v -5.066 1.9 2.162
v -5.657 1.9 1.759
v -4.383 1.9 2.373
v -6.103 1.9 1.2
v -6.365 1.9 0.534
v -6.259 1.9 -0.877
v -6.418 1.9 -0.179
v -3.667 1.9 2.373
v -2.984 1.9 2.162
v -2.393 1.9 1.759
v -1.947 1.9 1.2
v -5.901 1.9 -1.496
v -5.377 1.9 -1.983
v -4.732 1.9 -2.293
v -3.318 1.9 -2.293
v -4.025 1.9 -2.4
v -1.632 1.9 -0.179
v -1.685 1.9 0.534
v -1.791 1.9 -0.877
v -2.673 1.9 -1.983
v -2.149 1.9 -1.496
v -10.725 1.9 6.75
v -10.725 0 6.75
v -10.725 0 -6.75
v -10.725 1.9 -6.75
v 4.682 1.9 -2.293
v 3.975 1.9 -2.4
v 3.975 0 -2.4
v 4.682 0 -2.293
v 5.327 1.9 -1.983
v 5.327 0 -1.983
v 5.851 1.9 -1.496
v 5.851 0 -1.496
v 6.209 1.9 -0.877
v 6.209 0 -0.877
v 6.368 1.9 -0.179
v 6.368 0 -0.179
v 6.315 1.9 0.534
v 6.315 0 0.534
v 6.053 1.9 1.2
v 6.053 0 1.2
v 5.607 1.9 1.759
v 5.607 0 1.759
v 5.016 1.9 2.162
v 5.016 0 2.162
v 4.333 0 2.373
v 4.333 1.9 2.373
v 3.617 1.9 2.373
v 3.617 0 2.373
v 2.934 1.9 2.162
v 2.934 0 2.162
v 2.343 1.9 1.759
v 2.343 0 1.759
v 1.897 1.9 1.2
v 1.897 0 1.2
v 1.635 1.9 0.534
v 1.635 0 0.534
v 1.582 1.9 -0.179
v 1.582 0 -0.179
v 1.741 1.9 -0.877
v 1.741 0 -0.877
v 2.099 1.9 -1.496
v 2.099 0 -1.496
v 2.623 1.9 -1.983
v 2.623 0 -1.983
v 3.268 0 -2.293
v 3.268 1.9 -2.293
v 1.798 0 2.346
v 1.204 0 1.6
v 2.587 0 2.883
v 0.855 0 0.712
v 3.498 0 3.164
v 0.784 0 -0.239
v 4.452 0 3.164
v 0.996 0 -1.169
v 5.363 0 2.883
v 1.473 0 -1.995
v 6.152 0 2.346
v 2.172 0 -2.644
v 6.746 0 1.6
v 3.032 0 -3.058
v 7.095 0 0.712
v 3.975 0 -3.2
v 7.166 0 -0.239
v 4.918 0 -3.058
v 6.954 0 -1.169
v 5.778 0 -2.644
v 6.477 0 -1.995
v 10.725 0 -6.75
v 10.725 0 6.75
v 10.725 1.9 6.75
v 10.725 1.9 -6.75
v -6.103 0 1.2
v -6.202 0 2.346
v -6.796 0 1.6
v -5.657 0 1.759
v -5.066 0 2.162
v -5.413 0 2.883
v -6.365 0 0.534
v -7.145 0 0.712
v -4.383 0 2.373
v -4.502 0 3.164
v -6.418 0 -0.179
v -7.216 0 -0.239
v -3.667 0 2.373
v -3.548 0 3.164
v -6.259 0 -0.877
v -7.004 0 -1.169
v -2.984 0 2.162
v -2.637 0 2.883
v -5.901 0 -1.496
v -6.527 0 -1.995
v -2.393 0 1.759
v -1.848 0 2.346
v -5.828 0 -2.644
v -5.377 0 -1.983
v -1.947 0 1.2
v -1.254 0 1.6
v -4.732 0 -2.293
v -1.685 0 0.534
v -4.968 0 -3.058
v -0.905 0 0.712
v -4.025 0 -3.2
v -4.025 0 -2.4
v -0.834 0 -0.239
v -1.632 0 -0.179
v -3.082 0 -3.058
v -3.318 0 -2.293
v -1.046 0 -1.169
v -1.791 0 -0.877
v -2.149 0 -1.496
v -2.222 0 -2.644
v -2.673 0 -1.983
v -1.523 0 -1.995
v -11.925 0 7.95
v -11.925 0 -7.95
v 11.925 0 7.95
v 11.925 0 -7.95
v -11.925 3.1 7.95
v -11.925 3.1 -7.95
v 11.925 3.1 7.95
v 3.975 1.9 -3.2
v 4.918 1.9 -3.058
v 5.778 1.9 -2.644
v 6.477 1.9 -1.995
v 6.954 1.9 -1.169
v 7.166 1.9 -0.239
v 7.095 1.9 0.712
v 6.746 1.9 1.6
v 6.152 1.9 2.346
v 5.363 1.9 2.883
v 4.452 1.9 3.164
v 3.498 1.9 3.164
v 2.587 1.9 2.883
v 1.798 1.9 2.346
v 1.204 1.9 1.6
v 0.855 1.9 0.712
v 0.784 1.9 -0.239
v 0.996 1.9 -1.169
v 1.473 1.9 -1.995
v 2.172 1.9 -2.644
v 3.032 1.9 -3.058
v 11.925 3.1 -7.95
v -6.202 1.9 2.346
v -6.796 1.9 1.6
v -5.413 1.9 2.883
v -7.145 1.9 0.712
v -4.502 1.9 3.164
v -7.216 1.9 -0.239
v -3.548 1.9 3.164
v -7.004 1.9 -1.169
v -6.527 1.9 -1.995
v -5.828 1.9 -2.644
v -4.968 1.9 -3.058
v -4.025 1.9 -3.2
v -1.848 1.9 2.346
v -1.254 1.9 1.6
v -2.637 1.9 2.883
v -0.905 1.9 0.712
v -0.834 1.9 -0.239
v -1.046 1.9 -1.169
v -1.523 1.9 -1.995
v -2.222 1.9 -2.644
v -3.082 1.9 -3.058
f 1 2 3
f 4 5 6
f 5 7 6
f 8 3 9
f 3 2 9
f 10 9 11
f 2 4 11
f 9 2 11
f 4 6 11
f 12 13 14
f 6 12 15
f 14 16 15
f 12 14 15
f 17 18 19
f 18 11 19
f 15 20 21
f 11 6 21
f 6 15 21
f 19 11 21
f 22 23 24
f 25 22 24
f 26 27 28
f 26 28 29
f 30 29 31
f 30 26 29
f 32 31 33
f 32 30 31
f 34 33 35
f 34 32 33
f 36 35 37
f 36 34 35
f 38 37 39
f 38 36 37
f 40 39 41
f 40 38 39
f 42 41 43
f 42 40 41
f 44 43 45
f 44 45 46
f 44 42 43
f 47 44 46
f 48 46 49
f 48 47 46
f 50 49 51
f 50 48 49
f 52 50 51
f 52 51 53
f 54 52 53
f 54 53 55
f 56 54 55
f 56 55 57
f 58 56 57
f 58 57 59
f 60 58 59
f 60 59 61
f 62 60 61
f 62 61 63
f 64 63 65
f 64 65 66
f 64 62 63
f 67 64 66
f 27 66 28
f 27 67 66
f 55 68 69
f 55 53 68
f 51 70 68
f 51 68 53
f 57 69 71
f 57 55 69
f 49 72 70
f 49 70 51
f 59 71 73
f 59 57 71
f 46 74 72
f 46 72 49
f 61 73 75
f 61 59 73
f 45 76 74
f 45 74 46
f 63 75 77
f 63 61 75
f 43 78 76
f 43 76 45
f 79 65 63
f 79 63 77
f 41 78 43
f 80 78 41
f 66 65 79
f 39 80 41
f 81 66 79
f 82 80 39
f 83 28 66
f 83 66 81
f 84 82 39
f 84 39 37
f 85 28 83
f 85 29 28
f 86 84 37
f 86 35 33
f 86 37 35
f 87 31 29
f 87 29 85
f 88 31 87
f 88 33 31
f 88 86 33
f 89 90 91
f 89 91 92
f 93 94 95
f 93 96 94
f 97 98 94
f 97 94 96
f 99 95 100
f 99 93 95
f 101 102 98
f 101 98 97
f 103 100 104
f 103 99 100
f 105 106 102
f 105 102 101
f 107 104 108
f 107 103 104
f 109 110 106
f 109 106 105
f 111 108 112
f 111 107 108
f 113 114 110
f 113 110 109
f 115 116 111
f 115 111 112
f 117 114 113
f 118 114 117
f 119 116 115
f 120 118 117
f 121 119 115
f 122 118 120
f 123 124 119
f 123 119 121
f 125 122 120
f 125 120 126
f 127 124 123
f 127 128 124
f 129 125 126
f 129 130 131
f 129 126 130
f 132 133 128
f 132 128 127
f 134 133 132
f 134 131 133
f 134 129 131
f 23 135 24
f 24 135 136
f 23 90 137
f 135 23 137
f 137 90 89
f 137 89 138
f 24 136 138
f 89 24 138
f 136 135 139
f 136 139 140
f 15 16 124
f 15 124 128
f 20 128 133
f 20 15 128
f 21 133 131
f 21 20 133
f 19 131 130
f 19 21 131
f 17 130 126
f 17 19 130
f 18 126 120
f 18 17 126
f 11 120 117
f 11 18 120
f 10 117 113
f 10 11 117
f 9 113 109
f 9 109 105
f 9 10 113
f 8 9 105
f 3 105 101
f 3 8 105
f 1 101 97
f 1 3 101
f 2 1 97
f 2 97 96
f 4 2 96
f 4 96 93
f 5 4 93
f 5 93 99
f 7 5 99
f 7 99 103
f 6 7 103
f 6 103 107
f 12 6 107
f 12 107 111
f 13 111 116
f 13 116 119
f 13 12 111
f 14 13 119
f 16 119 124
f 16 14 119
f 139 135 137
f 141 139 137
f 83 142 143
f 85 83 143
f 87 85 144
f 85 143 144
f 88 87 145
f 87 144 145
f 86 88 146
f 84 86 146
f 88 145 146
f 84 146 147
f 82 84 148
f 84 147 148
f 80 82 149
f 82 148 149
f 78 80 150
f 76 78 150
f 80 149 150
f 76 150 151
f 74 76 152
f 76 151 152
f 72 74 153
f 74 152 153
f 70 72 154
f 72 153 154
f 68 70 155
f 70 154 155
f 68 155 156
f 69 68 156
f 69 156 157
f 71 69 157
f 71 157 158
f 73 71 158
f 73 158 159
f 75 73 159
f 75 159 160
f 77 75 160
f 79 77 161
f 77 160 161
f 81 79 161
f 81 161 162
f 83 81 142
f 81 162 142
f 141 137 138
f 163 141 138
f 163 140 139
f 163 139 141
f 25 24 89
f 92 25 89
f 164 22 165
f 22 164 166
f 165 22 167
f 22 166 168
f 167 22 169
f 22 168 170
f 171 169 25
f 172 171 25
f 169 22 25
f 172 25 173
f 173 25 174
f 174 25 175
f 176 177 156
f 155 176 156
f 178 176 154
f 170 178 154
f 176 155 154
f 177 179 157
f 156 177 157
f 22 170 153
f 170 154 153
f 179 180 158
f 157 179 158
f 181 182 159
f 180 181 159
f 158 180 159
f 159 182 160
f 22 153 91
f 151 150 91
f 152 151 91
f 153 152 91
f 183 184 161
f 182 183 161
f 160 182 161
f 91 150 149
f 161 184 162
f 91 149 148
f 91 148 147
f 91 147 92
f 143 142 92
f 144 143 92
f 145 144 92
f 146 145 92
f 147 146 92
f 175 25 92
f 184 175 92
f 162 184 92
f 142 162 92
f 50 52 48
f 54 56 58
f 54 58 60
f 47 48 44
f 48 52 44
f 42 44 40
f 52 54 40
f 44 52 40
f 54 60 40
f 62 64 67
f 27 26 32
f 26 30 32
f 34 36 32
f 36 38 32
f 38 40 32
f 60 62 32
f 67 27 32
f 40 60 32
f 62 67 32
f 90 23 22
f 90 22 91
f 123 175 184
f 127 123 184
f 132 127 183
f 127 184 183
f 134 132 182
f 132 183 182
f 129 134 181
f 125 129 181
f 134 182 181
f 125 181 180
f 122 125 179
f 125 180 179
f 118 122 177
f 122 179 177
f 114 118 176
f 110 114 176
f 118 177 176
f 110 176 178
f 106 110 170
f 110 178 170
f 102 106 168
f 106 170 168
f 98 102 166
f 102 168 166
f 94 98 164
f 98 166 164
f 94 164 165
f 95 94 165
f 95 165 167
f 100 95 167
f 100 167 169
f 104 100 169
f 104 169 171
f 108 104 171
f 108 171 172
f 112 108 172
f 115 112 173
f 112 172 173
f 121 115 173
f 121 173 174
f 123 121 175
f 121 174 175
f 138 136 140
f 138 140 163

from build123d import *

# Parameters (mm, degrees)
SKETCH1_W           = 23.85
SKETCH1_H           = 15.9
BOSS_EXTRUDE1_DEPTH = 3.1
SHELL1_T            = -1.2
SKETCH2_R           = 3.2
SKETCH2_R_2         = 2.4
BOSS_EXTRUDE2_DEPTH = 1.9
LPATTERN1_COUNT     = 2
LPATTERN1_PITCH     = 8


with BuildPart() as part:
    # Sketch1 → Boss-Extrude1 (new body)
    with BuildSketch(Plane(origin=(0, 0, 0), x_dir=(1, 0, 0), z_dir=(0, 1, 0))):
        Rectangle(SKETCH1_W, SKETCH1_H)
    extrude(amount=BOSS_EXTRUDE1_DEPTH)

    # Shell1
    shell1_openings = [part.faces().sort_by_distance(p)[0] for p in [
        (0, 0, 0),
    ]]
    offset(amount=SHELL1_T, openings=shell1_openings, kind=Kind.INTERSECTION)

    # Sketch2 → Boss-Extrude2 (add)
    with BuildSketch(Plane.XZ.offset(-1.9)):
        with Locations(Location((3.975, 0, 0), (0, 0, 270))):
            Circle(SKETCH2_R)
        with Locations(Location((3.975, 0, 0), (0, 0, 270))):
            Circle(SKETCH2_R_2, mode=Mode.SUBTRACT)
    boss_extrude2 = extrude(amount=BOSS_EXTRUDE2_DEPTH)

    # LPattern1: Boss-Extrude2 ×2
    with Locations(*[(-i * LPATTERN1_PITCH, 0, 0) for i in range(1, LPATTERN1_COUNT)]):
        add(boss_extrude2)


solid = part.part
